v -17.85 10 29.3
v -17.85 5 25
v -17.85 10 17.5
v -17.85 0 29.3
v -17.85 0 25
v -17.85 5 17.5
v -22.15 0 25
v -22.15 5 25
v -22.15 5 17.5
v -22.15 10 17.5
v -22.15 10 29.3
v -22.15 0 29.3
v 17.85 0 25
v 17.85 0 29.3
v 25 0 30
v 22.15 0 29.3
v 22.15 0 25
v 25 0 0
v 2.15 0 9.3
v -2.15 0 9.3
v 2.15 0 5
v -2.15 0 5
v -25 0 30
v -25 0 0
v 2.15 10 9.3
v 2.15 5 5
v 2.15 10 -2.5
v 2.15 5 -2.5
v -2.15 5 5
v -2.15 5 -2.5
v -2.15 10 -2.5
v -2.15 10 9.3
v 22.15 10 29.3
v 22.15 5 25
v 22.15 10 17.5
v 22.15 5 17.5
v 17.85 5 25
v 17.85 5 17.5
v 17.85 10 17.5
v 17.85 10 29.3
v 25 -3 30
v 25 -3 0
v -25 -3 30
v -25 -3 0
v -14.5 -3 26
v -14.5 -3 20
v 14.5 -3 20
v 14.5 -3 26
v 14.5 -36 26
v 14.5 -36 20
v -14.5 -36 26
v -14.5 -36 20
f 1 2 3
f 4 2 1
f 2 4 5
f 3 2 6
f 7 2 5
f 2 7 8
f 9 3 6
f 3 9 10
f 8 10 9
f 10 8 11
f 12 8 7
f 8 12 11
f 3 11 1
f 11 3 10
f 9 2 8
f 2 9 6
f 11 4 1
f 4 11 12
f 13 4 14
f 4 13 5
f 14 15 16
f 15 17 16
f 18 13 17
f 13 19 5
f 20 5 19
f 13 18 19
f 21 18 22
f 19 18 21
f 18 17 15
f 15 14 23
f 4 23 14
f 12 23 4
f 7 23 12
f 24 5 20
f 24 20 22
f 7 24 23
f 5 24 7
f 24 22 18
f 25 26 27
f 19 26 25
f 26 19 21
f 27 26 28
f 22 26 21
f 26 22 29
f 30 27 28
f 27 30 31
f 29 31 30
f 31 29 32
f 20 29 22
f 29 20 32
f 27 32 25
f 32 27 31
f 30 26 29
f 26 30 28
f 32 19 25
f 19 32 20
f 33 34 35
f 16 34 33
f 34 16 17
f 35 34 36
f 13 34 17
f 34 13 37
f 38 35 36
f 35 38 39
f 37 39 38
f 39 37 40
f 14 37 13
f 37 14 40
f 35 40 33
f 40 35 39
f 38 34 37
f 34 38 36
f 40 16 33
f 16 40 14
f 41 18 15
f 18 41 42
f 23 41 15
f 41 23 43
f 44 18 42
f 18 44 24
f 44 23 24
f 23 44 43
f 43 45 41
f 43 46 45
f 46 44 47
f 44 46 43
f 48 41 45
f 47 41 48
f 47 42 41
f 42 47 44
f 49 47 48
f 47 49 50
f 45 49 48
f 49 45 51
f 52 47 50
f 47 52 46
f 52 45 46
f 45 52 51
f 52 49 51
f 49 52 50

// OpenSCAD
// file: ../../modules/skadis.scad
ikea_skadis_hole_w = 4.3;
ikea_skadis_hook_depth = 5;
ikea_skadis_hole_h = 7.5;
ikea_skadis_holes_dist = 80;
ikea_skadis_holes_horiz_dist = 40;

module skadis_hook() {
    color("green")
    translate([0,ikea_skadis_hook_depth,-ikea_skadis_hole_h]) cube([ikea_skadis_hole_w,ikea_skadis_hook_depth,ikea_skadis_hole_h ]);

    color("violet")
    translate([0,0,0]) cube([ikea_skadis_hole_w,ikea_skadis_hook_depth*2,ikea_skadis_hole_w ]);
}

module skadis_double_hooks() {
    skadis_hook();
    
    translate([0,0,ikea_skadis_holes_dist]) skadis_hook();
    
    color("yellow")
    translate([0,-ikea_skadis_hook_depth,0])
    cube([ikea_skadis_hole_w,ikea_skadis_hook_depth,ikea_skadis_holes_dist + ikea_skadis_hole_w]);
}

module skadis_triple_horiz_hooks() {
    translate([-20 - ikea_skadis_hole_w / 2,0,0]) union() {
        skadis_hook();
        translate([20,0,-20]) skadis_hook();
        translate([40,0,0]) skadis_hook();
    }
}

//skadis_double_hooks();
//skadis_triple_horiz_hooks();
// main file
include <../../modules/skadis.scad>;

translate([-25,-3,0]) cube([50,3,30]);
translate([0,0,25]) skadis_triple_horiz_hooks();
translate([-14.5,-36,20]) cube([29, 33, 6]);
